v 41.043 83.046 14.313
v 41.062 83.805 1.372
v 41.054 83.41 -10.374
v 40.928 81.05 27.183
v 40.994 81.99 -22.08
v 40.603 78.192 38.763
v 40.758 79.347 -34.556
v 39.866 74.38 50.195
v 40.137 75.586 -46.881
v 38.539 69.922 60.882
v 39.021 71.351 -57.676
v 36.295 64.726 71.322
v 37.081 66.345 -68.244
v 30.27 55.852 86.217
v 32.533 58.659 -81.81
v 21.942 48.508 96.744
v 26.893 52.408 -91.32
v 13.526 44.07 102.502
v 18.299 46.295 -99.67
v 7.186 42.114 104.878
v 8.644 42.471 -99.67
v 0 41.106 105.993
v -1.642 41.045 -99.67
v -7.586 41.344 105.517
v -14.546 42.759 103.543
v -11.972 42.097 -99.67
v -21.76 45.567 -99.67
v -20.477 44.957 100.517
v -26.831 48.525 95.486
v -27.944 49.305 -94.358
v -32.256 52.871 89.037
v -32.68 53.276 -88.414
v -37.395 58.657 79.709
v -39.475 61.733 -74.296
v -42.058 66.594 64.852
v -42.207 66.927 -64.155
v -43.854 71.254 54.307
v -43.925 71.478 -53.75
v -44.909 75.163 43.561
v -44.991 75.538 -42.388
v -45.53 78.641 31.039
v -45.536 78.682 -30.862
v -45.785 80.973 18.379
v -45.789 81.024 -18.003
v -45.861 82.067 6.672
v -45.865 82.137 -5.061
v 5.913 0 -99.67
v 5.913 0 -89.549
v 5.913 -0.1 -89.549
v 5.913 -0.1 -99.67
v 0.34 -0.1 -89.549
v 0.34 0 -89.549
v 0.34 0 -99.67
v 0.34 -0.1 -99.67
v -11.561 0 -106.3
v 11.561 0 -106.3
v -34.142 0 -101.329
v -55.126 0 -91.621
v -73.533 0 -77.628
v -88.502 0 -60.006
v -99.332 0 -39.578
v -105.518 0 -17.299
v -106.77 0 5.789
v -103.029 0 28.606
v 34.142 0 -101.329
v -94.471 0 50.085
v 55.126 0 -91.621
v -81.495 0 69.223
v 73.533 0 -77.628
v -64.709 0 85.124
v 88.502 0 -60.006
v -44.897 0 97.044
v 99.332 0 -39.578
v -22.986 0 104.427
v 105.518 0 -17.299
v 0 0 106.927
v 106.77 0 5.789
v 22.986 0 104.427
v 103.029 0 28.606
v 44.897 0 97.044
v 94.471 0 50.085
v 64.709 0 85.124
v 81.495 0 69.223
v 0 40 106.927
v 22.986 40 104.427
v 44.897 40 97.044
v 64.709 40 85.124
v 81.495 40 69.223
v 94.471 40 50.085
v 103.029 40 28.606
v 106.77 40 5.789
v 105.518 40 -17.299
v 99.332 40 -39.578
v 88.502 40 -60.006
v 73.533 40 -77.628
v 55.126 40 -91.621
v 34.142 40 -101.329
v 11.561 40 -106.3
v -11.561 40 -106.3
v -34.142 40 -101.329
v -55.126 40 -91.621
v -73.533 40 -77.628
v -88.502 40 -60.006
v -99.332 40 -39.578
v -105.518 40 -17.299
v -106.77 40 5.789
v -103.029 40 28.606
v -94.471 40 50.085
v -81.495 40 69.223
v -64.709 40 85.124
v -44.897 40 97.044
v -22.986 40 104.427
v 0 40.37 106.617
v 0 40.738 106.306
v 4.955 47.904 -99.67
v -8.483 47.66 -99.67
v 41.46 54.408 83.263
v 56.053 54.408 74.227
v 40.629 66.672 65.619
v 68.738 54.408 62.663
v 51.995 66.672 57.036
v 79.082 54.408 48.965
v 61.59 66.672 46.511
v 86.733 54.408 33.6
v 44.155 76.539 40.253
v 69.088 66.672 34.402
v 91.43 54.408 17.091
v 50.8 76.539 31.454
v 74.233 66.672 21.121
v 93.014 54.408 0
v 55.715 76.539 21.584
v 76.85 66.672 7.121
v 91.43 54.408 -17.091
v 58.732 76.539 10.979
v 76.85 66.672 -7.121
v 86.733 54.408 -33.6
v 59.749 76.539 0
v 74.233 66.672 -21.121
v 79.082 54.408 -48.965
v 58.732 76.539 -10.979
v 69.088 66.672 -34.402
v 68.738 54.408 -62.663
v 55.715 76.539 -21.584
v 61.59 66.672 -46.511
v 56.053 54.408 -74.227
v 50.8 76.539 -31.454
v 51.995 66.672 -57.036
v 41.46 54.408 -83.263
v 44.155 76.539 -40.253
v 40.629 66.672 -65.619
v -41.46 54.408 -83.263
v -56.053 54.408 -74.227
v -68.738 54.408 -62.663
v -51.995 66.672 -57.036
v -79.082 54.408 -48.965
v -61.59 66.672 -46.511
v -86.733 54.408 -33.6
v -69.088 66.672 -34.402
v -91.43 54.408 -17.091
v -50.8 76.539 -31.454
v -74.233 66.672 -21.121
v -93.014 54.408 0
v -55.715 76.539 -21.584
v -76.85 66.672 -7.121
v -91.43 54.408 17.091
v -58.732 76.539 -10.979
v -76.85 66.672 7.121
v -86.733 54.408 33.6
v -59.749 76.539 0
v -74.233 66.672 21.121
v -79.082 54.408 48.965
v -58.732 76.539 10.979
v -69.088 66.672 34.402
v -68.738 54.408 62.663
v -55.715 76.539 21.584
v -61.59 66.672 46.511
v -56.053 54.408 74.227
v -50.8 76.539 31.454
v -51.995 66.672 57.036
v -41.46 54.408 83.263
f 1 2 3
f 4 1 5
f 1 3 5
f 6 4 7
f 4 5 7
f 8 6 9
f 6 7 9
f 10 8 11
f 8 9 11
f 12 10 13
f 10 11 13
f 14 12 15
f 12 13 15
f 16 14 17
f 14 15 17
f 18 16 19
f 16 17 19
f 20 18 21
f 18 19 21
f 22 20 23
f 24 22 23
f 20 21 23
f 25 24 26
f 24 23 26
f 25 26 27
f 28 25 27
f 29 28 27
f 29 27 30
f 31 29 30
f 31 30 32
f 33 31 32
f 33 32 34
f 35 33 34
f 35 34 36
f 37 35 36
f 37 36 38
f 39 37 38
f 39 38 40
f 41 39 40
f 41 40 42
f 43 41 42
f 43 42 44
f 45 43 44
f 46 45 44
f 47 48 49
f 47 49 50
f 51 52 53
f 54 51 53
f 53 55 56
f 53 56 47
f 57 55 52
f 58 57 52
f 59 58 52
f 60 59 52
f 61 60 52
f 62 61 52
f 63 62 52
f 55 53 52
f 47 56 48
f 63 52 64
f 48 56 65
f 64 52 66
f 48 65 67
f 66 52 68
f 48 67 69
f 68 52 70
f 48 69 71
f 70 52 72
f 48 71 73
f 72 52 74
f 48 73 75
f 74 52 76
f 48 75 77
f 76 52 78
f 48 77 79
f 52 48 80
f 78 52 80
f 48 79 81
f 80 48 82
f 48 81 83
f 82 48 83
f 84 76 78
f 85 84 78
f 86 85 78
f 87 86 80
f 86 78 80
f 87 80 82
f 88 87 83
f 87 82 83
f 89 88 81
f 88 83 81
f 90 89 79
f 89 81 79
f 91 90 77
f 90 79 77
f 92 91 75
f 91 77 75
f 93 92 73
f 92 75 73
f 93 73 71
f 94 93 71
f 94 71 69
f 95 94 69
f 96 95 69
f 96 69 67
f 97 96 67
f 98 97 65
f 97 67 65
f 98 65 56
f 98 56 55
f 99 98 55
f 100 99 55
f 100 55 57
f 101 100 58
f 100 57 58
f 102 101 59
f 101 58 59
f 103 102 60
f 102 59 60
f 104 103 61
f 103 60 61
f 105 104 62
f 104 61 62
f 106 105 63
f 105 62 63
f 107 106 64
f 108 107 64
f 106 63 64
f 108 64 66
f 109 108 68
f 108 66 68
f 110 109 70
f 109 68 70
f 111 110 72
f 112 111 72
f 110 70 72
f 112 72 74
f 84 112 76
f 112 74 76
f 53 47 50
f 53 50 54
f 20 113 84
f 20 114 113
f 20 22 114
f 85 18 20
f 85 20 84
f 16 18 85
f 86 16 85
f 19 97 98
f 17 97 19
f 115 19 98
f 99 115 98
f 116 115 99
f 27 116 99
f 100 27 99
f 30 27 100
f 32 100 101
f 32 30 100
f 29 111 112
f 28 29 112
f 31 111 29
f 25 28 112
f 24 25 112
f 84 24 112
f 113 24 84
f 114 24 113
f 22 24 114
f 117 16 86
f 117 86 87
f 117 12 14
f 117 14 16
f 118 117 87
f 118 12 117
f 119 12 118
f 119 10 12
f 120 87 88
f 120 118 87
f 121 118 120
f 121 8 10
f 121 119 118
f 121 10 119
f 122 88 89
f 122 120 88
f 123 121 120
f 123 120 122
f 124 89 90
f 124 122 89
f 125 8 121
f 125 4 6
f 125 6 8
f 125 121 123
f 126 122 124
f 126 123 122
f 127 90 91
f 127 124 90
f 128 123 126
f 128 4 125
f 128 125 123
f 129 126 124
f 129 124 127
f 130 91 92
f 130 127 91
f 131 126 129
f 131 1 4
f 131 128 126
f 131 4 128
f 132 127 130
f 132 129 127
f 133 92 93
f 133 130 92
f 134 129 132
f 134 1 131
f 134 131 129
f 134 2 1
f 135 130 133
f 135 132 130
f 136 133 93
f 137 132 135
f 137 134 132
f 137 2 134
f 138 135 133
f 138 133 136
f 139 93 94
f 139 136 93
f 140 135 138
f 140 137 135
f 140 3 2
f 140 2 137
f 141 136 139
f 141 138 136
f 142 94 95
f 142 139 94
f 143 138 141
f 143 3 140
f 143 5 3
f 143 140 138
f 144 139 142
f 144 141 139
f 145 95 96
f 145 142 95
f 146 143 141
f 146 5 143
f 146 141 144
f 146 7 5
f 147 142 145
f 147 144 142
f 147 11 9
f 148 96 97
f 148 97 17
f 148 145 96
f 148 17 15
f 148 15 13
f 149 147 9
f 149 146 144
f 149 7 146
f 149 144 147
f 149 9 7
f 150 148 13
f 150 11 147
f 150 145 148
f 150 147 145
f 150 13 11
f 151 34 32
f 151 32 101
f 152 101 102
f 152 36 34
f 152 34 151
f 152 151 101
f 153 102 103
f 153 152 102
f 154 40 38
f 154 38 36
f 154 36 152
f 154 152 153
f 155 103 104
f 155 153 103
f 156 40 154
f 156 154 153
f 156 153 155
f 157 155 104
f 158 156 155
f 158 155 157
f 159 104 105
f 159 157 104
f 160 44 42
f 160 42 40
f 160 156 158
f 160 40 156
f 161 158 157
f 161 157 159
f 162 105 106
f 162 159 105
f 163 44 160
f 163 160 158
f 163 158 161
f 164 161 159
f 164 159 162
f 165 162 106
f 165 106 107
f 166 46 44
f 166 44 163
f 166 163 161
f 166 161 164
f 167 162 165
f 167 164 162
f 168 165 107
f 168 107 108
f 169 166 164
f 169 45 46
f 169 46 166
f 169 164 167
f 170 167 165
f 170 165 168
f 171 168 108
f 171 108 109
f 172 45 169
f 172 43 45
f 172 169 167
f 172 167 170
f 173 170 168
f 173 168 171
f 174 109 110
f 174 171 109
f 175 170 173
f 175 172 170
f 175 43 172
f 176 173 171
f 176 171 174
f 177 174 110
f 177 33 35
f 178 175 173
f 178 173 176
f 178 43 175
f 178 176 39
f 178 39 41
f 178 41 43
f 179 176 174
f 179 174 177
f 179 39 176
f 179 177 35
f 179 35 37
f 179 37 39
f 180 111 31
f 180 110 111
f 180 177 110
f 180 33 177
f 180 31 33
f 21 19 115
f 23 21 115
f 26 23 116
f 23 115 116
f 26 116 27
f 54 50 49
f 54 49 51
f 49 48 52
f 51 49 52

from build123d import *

# Parameters (mm, degrees)
SKETCH1_R           = 106.926704947
BOSS_EXTRUDE1_DEPTH = 40
DOME1_FACE_RADIUS   = 106.926704947
DOME1_HEIGHT        = 50
SKETCH2_W           = 5.57321272
SKETCH2_H           = 10.121090013
BOSS_EXTRUDE3_DEPTH = 0.1
SKETCH3_R           = 43.5
CUT_EXTRUDE2_DEPTH  = 250.43054033


with BuildPart() as part:
    # Sketch1 → Boss-Extrude1 (new body)
    with BuildSketch(Plane(origin=(0, 0, 0), x_dir=(1, 0, 0), z_dir=(0, 1, 0))):
        with Locations(Location((0, 0, 0), (0, 0, 270))):
            Circle(SKETCH1_R)
    extrude(amount=BOSS_EXTRUDE1_DEPTH)

    # Dome1: a dome of height H over a round flat face of radius A is a cap of a sphere of radius (A * A + H * H) / (2 * H)
    dome1_r = (DOME1_FACE_RADIUS * DOME1_FACE_RADIUS + DOME1_HEIGHT * DOME1_HEIGHT) / (2 * DOME1_HEIGHT)
    dome1_base = Plane((0, 40, 0), z_dir=(0, 1, 0))
    with Locations(dome1_base.offset(DOME1_HEIGHT - dome1_r)):
        dome1_ball = Sphere(dome1_r, mode=Mode.PRIVATE)
    add(split(dome1_ball, bisect_by=dome1_base, keep=Keep.TOP, mode=Mode.PRIVATE))

    # Sketch2 → Boss-Extrude3 (add)
    with BuildSketch(Plane(origin=(0, 0, 0), x_dir=(-1, 0, 0), z_dir=(0, -1, 0))):
        with Locations((-3.126868322, 94.609638257)):
            Rectangle(SKETCH2_W, SKETCH2_H)
    extrude(amount=BOSS_EXTRUDE3_DEPTH)

    # Sketch3 → Cut-Extrude2 (cut, through all)
    with BuildSketch(Plane(origin=(0, 0, -99.670183264), x_dir=(-1, 0, 0), z_dir=(0, 0, -1))):
        with Locations((2.431626064, 84.537651938)):
            Circle(SKETCH3_R)
    extrude(amount=-CUT_EXTRUDE2_DEPTH, mode=Mode.SUBTRACT)


solid = part.part
